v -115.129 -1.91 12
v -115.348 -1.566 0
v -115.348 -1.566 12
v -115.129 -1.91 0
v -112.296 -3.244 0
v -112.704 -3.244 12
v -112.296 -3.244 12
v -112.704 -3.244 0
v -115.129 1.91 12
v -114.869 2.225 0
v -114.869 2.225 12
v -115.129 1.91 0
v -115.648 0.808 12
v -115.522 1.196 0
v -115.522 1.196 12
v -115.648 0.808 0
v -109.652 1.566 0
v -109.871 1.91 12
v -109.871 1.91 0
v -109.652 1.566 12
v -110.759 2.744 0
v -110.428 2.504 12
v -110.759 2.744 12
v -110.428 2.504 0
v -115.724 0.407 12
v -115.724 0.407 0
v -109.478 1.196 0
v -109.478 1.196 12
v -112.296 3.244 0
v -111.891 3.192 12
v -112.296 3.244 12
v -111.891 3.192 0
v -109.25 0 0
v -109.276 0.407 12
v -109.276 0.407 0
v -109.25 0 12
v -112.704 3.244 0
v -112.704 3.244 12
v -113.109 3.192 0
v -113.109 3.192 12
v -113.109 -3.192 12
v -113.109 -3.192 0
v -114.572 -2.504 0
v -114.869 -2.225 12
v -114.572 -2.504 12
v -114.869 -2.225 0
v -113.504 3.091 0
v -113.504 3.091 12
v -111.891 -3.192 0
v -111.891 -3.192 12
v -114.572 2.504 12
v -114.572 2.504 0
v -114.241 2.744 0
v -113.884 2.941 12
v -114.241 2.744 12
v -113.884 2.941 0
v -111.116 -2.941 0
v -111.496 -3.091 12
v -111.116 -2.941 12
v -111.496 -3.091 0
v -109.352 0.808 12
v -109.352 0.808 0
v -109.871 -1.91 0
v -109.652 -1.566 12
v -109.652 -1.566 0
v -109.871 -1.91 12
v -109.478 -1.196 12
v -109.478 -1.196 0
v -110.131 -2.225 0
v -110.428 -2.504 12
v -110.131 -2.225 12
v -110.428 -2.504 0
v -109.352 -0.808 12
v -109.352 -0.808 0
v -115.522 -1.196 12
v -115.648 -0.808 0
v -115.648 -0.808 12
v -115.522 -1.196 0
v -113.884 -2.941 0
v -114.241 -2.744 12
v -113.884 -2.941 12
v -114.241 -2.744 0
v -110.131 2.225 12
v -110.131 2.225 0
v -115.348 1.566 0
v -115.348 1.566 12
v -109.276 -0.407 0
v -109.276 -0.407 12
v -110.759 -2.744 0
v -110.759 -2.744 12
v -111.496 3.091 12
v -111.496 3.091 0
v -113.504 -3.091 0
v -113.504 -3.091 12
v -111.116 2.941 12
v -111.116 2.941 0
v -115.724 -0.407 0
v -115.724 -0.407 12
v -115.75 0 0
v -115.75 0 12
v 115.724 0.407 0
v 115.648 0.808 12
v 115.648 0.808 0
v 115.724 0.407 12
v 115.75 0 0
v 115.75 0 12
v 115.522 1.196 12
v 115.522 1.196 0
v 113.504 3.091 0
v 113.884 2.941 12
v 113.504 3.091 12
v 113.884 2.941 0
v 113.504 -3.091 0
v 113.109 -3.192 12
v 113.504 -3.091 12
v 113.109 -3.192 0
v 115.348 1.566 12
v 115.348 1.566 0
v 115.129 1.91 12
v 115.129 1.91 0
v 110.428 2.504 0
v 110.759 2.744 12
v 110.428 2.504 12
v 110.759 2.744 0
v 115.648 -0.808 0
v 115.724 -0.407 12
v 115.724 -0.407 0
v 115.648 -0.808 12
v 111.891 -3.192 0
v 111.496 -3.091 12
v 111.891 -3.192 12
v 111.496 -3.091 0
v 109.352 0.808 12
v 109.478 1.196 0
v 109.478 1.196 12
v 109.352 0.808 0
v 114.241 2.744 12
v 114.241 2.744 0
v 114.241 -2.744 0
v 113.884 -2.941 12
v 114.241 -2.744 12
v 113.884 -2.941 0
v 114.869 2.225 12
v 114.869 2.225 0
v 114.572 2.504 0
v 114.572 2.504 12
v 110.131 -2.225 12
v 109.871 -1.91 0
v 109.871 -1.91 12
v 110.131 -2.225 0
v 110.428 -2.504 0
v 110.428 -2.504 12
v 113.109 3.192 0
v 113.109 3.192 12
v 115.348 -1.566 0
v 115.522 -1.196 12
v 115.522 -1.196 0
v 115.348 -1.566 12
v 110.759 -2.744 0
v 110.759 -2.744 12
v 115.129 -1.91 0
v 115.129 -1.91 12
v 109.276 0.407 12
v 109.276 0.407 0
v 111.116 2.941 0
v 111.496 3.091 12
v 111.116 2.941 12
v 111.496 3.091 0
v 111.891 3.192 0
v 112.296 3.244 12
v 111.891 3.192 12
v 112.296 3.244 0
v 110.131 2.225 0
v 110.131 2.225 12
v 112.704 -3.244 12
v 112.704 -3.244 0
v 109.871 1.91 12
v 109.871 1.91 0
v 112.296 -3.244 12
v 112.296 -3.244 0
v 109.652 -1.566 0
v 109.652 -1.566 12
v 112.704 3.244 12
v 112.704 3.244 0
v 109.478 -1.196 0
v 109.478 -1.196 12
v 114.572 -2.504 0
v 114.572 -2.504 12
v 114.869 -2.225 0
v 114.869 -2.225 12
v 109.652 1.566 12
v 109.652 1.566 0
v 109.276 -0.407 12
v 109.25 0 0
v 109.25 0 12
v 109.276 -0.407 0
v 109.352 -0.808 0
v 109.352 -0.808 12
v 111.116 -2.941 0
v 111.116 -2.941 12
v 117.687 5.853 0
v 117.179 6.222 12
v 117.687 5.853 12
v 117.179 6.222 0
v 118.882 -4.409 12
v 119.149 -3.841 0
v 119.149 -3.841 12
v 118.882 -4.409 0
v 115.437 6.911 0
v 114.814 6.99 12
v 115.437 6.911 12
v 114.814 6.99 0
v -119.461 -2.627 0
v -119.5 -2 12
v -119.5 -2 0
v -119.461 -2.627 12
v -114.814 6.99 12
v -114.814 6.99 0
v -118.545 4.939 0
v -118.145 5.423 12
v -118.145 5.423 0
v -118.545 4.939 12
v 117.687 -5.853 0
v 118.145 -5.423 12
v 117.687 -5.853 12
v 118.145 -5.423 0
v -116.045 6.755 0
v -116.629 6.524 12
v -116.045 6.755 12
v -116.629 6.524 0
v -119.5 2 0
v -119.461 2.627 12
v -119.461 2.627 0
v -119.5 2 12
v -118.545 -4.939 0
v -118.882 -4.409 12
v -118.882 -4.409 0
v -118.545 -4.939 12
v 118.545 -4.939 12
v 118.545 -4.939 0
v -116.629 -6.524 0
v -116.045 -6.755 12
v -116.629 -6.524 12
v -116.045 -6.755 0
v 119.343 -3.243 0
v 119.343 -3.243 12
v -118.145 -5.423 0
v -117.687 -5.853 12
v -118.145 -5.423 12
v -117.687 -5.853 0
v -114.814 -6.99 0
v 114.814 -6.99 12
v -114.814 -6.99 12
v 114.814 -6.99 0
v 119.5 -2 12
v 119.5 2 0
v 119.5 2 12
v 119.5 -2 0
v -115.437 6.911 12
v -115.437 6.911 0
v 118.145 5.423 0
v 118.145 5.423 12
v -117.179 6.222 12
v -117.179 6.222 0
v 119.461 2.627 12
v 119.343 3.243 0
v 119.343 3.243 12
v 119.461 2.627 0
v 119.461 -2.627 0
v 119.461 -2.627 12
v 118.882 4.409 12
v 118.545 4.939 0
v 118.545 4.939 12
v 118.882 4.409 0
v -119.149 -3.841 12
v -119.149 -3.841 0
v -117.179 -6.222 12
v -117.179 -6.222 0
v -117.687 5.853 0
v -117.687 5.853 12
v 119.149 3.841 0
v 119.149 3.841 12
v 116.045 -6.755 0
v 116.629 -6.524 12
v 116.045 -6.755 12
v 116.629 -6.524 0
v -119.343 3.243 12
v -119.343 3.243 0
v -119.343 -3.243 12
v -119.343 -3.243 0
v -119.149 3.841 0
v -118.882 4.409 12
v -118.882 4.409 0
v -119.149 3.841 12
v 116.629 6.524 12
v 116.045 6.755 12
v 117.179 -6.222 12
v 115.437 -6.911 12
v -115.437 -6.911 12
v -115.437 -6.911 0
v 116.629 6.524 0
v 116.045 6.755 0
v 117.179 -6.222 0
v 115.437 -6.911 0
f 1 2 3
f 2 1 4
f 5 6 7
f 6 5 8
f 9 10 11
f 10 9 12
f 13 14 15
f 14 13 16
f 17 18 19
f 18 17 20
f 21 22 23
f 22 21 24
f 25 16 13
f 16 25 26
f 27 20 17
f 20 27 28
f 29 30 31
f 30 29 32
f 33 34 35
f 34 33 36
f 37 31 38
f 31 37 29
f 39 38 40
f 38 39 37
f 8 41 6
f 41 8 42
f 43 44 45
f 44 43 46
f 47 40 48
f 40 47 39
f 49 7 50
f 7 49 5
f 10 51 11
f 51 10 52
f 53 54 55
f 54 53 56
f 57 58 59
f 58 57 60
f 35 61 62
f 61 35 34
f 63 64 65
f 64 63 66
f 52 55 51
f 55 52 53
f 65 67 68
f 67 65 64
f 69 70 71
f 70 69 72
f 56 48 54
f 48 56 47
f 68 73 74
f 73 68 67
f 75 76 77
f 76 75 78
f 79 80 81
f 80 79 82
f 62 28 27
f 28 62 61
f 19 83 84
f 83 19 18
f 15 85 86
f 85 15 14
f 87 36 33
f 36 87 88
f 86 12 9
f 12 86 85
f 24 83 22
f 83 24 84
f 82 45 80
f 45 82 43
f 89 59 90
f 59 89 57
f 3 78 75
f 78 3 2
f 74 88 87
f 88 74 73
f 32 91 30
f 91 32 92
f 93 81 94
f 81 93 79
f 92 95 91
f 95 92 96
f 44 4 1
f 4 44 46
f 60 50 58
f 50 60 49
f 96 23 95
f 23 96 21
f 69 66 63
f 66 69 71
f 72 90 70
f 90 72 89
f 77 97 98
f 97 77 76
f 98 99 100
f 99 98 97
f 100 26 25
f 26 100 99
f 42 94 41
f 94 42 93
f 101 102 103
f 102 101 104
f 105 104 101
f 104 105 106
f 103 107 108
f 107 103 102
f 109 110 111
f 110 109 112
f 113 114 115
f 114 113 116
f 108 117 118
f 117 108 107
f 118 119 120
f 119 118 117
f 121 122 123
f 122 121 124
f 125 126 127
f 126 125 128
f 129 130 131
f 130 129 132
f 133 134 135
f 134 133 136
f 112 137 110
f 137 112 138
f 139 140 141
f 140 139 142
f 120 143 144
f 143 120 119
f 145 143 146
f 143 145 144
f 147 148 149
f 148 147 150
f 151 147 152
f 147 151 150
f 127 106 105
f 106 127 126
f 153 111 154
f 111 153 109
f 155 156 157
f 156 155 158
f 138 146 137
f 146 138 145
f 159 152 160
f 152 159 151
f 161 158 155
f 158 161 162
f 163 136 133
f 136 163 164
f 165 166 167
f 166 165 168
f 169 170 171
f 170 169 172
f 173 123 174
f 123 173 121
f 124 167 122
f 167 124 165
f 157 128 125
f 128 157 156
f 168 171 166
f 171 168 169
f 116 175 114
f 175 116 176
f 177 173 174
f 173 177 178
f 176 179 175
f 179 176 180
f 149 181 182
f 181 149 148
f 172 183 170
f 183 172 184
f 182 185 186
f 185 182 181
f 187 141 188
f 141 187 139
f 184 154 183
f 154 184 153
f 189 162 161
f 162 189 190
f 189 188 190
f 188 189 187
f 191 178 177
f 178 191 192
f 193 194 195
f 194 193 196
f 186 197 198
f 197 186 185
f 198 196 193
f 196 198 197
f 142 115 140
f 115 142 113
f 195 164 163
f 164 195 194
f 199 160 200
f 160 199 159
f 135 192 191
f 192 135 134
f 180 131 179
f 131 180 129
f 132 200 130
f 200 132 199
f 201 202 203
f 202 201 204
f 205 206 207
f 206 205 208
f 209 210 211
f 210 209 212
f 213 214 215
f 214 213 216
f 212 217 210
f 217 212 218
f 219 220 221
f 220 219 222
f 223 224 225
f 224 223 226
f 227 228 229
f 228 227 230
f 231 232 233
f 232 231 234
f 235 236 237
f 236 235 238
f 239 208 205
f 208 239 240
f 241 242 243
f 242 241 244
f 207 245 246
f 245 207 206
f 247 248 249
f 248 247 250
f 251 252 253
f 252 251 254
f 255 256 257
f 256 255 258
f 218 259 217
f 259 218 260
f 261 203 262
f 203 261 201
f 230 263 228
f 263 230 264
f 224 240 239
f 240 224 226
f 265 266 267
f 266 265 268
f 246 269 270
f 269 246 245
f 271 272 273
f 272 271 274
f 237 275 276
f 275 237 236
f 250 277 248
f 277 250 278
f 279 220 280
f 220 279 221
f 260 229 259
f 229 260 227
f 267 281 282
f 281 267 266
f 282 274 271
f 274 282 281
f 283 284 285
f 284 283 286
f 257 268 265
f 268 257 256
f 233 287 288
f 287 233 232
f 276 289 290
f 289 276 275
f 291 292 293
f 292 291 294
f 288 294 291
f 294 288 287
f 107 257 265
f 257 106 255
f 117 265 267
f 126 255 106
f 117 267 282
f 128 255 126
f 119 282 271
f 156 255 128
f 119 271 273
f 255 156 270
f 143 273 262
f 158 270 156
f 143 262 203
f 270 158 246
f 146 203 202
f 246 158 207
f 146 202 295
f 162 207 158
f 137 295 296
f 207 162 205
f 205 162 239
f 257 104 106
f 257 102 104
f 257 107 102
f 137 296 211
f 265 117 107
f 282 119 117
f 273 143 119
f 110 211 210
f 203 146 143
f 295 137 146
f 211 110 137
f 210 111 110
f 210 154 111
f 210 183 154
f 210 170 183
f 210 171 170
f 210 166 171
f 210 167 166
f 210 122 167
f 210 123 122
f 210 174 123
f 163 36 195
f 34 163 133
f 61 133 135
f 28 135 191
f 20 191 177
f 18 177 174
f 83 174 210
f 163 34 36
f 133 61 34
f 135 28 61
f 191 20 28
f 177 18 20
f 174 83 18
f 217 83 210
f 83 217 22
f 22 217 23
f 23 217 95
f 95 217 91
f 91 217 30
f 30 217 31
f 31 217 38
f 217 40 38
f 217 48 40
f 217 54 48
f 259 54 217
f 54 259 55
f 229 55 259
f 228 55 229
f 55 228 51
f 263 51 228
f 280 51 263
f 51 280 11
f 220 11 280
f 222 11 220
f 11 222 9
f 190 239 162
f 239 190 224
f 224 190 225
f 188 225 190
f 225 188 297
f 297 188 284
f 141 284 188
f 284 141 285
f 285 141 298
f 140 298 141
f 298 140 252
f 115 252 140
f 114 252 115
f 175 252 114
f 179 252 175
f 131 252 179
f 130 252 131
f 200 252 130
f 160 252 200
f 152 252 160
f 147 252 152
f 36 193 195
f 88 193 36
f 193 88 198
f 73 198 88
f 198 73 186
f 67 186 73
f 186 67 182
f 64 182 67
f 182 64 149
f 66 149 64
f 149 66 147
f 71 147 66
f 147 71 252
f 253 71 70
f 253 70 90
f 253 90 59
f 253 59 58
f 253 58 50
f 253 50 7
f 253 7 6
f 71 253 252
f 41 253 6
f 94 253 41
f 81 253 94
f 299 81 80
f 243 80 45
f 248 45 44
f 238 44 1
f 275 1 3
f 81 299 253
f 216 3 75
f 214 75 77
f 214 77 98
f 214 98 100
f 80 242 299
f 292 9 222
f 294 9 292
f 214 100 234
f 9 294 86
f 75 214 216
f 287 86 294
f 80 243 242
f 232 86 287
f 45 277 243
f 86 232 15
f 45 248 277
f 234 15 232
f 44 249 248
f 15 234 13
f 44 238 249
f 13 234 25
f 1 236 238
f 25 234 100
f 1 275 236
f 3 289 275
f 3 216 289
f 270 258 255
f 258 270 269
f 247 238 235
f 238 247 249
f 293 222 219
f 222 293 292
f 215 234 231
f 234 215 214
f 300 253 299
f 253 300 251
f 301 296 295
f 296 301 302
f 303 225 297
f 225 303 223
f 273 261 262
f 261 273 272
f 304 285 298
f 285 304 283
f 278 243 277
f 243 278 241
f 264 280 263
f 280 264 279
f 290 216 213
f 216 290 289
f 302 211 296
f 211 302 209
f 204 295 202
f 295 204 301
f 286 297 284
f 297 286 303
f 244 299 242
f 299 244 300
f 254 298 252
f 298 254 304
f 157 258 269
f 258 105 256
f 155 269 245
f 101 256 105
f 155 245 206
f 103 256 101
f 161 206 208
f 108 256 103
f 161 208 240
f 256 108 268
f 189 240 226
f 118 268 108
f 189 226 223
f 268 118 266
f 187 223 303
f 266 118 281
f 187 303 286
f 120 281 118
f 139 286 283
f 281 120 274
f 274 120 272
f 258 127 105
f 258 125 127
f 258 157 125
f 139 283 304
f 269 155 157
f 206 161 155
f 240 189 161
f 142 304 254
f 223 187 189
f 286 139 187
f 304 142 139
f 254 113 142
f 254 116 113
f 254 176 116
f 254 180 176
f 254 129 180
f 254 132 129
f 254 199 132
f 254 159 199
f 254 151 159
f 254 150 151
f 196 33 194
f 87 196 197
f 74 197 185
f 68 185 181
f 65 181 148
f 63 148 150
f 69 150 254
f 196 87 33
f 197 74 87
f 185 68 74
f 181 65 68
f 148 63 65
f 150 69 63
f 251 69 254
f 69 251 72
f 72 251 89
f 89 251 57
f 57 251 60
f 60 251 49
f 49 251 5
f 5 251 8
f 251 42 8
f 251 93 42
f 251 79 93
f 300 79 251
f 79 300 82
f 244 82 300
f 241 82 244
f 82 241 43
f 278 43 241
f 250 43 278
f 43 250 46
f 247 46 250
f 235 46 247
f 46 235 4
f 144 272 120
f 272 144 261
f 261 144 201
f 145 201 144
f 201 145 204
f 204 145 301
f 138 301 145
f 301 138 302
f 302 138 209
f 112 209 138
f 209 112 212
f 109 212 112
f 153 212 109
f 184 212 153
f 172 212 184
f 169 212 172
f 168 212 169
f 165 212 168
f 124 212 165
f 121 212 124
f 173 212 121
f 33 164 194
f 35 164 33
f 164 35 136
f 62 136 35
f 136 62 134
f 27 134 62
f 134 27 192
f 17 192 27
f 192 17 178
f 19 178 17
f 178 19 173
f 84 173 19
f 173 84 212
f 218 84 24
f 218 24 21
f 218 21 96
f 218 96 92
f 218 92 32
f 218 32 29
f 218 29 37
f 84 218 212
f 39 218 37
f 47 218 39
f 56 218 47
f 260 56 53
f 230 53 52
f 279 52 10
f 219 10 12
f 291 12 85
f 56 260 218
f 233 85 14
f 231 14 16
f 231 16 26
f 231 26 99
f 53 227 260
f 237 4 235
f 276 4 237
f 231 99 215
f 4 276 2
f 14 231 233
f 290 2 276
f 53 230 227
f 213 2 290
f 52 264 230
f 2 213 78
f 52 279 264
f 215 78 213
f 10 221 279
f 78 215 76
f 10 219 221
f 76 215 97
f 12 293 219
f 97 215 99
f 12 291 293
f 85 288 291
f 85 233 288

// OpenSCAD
$fn = 50;


difference() {
	union() {
		hull() {
			translate(v = [-114.5000000000, 2.0000000000, 0]) {
				cylinder(h = 12, r = 5);
			}
			translate(v = [114.5000000000, 2.0000000000, 0]) {
				cylinder(h = 12, r = 5);
			}
			translate(v = [-114.5000000000, -2.0000000000, 0]) {
				cylinder(h = 12, r = 5);
			}
			translate(v = [114.5000000000, -2.0000000000, 0]) {
				cylinder(h = 12, r = 5);
			}
		}
	}
	union() {
		translate(v = [-112.5000000000, 0.0000000000, -100.0000000000]) {
			cylinder(h = 200, r = 3.2500000000);
		}
		translate(v = [-112.5000000000, 0.0000000000, -100.0000000000]) {
			cylinder(h = 200, r = 3.2500000000);
		}
		translate(v = [112.5000000000, 0.0000000000, -100.0000000000]) {
			cylinder(h = 200, r = 3.2500000000);
		}
		translate(v = [112.5000000000, 0.0000000000, -100.0000000000]) {
			cylinder(h = 200, r = 3.2500000000);
		}
	}
}
